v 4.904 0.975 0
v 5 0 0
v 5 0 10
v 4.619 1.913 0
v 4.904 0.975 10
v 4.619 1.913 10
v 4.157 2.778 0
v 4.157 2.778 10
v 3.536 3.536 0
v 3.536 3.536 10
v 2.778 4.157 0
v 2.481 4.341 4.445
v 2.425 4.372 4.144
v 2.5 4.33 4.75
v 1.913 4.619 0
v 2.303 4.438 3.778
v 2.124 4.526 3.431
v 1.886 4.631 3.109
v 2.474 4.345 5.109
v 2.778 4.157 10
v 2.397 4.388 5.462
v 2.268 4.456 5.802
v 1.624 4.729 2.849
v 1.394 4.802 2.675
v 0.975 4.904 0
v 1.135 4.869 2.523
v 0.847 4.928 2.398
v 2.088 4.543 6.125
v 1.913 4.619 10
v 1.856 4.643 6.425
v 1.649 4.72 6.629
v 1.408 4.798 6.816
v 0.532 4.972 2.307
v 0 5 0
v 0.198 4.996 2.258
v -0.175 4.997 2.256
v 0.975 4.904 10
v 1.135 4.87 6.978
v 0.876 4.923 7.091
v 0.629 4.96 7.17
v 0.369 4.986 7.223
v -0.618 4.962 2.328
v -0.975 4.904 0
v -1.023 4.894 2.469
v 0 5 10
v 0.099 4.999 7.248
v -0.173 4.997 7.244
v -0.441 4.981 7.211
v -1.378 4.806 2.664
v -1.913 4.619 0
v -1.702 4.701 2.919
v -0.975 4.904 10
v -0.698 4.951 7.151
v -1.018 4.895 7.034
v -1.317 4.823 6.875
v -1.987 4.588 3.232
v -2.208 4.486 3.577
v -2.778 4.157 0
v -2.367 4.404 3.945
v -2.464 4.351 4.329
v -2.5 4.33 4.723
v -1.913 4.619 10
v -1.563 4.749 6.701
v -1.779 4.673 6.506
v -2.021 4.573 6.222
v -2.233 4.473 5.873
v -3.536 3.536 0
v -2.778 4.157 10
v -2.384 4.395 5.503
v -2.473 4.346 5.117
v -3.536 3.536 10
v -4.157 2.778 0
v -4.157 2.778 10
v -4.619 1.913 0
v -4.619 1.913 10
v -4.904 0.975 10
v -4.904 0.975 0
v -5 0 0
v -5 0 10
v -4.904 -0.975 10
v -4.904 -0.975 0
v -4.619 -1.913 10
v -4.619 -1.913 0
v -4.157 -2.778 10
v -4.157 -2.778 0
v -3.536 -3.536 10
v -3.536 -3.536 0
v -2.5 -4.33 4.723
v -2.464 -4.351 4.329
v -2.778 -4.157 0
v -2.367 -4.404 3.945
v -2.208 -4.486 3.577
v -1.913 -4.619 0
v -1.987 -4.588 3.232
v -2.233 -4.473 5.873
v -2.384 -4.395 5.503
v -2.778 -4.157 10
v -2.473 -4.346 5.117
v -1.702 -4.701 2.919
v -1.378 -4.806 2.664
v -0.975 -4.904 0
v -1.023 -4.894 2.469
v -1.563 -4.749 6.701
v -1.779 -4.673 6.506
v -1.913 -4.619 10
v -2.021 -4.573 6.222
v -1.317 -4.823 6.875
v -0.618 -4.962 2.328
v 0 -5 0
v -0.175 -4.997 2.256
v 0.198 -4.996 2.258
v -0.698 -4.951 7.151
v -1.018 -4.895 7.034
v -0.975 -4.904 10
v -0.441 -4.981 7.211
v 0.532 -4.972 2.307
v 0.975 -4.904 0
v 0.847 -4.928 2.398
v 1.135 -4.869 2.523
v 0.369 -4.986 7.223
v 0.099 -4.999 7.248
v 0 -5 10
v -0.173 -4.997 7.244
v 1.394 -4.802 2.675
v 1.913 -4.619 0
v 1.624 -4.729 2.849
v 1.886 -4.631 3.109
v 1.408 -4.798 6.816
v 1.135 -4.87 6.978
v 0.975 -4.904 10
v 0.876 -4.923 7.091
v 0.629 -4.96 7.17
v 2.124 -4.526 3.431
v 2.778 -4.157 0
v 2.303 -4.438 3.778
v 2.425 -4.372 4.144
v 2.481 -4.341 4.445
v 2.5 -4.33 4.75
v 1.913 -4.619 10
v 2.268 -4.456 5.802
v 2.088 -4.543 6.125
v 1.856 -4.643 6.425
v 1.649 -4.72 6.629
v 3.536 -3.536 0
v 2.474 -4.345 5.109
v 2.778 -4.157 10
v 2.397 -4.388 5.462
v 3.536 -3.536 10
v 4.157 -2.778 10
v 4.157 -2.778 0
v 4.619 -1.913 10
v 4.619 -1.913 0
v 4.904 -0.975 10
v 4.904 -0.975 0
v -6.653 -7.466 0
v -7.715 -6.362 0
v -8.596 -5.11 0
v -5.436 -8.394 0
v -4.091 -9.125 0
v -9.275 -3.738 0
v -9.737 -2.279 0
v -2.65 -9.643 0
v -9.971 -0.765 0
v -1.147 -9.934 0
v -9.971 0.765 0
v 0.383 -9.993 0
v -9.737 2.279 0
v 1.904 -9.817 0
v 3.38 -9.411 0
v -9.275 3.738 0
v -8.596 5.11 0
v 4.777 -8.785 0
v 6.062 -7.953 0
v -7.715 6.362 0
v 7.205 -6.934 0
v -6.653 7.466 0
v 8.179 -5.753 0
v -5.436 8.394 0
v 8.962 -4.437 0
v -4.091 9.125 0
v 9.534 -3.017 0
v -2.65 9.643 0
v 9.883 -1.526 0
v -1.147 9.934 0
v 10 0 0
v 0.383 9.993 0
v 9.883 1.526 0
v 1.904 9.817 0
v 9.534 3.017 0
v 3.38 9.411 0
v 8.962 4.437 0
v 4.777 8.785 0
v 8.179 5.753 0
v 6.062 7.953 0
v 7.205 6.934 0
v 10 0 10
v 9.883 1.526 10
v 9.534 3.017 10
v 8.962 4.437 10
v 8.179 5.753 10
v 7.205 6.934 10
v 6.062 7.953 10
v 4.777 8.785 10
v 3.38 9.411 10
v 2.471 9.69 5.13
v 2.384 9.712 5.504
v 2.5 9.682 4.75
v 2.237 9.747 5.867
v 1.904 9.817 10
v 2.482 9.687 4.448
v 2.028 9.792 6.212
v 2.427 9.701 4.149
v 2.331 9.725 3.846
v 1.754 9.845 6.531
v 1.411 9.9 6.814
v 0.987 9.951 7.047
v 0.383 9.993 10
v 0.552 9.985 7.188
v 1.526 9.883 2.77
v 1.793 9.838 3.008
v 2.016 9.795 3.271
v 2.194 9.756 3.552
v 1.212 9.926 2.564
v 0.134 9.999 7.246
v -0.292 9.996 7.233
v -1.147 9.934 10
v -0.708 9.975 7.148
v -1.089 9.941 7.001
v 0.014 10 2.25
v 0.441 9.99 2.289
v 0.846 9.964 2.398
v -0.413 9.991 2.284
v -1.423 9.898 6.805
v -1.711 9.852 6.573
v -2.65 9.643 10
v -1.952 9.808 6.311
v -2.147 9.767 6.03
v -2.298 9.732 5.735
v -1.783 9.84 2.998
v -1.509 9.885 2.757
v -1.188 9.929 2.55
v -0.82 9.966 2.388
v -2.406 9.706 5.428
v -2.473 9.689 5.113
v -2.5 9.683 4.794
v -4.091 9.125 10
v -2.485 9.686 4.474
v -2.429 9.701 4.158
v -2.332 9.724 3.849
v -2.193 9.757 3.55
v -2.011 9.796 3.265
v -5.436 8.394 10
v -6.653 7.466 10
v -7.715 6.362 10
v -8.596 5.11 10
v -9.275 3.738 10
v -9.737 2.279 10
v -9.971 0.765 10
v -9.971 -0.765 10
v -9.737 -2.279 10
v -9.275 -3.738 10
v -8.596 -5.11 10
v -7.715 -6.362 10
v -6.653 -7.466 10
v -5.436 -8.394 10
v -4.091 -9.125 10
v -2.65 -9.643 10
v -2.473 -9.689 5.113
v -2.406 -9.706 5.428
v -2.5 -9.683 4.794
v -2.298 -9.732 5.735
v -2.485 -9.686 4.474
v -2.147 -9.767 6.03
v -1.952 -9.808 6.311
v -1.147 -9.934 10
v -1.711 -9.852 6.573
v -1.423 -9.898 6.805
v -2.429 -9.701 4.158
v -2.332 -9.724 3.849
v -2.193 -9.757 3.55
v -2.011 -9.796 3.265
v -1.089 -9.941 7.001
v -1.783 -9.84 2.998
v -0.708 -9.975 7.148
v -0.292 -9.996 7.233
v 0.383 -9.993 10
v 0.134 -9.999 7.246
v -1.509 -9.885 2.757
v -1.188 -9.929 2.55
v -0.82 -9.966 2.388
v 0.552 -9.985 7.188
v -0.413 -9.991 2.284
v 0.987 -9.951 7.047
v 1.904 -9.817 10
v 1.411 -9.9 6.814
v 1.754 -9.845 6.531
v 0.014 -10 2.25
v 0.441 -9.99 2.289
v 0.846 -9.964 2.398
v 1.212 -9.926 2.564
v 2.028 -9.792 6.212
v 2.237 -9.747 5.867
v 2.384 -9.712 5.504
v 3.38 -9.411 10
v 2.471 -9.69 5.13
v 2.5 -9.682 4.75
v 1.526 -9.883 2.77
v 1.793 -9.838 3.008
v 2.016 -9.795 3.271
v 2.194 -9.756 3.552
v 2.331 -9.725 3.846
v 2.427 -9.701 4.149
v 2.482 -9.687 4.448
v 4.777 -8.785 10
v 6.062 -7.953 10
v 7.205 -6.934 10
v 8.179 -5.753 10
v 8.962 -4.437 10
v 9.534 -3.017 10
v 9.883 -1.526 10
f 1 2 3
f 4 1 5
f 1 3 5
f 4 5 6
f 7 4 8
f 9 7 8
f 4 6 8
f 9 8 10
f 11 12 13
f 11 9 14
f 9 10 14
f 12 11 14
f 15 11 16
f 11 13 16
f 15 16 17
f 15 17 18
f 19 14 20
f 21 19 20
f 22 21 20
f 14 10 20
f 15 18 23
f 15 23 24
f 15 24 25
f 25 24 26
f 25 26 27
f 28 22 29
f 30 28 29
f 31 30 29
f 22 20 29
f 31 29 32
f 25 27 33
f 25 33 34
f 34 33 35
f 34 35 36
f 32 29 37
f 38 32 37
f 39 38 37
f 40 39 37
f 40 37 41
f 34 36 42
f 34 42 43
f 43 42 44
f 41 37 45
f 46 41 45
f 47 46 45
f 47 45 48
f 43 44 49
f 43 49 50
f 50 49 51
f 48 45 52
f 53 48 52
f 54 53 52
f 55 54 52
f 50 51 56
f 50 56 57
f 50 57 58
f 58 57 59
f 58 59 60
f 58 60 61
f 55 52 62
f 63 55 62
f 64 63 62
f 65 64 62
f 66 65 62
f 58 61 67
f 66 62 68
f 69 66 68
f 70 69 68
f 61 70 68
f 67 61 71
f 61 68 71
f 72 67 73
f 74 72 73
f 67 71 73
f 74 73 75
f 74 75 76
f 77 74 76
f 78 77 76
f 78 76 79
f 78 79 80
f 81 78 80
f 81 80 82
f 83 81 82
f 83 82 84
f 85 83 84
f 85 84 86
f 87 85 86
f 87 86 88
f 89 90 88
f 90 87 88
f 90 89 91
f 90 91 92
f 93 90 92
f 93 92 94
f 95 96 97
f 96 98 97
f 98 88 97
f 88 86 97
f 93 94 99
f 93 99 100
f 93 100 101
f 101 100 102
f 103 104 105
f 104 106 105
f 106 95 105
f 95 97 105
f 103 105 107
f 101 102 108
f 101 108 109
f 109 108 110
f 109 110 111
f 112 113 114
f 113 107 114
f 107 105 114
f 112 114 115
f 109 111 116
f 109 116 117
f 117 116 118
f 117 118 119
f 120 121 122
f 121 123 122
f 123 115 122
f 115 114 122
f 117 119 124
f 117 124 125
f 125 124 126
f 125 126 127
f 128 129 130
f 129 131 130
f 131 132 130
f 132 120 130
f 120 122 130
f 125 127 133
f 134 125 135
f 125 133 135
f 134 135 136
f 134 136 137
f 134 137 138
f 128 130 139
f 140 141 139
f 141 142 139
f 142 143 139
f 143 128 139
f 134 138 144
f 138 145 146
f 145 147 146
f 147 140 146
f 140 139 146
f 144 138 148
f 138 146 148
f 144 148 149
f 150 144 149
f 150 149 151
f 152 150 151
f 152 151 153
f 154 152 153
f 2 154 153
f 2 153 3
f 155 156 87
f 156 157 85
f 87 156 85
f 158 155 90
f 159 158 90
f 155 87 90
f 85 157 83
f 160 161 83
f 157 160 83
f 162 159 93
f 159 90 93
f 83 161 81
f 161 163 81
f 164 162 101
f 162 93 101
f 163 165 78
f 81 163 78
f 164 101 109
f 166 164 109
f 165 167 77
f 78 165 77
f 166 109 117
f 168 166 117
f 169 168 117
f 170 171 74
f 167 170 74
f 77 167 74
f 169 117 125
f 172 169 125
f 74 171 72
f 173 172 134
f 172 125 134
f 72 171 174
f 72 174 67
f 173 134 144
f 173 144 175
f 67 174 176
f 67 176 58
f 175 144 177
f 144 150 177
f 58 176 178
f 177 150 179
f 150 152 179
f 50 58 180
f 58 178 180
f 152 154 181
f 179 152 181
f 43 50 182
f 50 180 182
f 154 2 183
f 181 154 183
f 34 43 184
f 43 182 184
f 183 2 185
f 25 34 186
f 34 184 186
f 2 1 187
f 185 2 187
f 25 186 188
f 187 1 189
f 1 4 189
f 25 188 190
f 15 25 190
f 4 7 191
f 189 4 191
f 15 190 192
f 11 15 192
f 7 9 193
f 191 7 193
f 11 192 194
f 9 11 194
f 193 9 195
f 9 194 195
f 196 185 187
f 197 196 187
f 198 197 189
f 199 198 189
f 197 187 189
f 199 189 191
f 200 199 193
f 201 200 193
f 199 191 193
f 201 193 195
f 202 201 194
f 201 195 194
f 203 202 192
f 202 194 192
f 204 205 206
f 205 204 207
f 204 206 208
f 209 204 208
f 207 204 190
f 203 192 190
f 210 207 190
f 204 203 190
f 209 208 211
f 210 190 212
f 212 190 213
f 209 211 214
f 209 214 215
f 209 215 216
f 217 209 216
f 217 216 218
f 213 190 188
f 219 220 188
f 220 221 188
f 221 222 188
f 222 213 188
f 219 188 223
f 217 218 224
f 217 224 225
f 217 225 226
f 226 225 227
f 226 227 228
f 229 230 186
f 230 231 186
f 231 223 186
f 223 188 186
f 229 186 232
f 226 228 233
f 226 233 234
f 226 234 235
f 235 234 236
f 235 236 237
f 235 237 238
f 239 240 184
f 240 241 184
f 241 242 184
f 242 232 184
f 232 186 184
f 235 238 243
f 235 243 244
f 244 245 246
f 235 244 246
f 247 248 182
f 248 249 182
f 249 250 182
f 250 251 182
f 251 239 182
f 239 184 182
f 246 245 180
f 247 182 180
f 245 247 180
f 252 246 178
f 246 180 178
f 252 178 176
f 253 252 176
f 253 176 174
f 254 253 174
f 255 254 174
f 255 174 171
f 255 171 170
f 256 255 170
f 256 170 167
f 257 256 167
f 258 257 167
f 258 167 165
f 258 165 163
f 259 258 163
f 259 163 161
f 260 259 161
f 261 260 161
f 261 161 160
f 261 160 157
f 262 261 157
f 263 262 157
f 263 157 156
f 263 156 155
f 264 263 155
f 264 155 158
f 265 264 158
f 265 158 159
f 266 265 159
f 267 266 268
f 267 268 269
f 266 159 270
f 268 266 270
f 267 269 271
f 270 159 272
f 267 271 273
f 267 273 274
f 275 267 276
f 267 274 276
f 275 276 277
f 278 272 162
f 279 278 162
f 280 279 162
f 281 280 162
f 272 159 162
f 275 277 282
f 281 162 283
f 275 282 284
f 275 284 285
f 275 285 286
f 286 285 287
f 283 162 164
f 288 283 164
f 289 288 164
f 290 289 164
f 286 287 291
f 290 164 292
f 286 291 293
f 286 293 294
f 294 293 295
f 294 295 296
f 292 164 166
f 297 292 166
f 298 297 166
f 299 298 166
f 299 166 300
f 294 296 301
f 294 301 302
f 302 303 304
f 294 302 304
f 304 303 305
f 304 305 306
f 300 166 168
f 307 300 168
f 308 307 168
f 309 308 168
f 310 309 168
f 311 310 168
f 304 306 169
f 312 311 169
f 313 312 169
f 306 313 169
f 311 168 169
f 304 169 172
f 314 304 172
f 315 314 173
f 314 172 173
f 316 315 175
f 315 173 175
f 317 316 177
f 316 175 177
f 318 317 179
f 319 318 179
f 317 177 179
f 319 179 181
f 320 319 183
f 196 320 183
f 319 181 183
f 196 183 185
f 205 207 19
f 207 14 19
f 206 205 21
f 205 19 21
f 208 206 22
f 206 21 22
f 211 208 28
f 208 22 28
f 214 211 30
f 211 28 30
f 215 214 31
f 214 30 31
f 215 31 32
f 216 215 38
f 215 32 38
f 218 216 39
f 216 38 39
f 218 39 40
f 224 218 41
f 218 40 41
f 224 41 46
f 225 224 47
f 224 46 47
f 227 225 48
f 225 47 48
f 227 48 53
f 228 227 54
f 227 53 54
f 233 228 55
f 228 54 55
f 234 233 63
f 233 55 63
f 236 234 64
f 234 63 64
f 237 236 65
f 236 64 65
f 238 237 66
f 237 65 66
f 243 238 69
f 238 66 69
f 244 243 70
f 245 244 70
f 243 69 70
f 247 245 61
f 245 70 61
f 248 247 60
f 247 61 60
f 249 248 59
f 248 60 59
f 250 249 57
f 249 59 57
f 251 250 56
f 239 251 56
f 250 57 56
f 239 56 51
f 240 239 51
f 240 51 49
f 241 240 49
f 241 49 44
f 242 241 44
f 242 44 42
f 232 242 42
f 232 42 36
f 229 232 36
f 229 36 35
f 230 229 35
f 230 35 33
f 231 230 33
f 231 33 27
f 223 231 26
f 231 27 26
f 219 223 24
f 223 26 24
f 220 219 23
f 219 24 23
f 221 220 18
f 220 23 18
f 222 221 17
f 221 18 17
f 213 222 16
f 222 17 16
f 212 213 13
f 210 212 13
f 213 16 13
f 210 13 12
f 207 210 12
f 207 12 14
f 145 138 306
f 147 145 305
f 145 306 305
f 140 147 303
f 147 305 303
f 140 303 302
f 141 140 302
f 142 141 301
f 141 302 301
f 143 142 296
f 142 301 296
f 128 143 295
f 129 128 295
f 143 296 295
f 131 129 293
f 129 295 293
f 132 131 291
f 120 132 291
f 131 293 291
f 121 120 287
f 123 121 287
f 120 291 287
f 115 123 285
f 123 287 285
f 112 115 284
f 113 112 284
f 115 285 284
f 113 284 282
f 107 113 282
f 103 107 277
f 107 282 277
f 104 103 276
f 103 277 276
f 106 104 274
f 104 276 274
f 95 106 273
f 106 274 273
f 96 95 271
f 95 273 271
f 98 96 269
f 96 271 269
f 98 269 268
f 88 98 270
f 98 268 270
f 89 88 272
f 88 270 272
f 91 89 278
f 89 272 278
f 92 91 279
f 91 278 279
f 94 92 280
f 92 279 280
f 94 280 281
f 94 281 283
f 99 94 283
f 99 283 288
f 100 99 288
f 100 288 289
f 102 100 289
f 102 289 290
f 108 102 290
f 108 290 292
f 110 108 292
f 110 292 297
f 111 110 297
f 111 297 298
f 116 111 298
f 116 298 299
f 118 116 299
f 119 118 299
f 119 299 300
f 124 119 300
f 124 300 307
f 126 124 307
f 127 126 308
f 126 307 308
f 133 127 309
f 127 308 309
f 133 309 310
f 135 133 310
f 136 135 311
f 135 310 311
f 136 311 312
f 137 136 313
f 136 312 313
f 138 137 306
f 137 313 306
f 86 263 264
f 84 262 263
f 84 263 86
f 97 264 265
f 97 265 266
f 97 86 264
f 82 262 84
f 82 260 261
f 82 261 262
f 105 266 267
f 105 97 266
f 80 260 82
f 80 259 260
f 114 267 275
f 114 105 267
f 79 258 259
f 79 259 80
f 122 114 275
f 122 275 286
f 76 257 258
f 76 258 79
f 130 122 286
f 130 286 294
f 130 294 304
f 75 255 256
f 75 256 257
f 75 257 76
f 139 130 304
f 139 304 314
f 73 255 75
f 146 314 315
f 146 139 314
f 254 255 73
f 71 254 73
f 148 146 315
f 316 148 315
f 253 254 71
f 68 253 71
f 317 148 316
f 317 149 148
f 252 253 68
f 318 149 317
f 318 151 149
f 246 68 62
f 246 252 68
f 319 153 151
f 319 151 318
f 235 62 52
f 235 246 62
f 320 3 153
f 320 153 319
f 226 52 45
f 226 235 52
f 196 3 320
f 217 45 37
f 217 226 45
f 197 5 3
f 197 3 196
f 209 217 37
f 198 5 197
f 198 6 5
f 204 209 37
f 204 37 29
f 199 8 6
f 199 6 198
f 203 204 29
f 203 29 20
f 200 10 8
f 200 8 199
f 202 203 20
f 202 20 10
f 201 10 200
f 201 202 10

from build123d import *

# Parameters (mm, degrees)
F0_R     = 10
F1_DEPTH = 10
F2_R     = 5
F3_DEPTH = 25
F4_R     = 2.5
F5_DEPTH = 12.5


with BuildPart() as f1:
    # F0 (on Top) → F1 (new body)
    with BuildSketch(Plane.XY):
        Circle(F0_R)
    extrude(amount=F1_DEPTH)

    # F2 (on face) → F3 (cut)
    with BuildSketch(Plane.XY.offset(10)):
        Circle(F2_R)
    extrude(amount=-F3_DEPTH, mode=Mode.SUBTRACT)

    # F4 (on Front) → F5 (cut, symmetric)
    with BuildSketch(Plane.XZ):
        with Locations((0, 4.75)):
            Circle(F4_R)
    extrude(amount=F5_DEPTH, both=True, mode=Mode.SUBTRACT)


solid = f1.part
